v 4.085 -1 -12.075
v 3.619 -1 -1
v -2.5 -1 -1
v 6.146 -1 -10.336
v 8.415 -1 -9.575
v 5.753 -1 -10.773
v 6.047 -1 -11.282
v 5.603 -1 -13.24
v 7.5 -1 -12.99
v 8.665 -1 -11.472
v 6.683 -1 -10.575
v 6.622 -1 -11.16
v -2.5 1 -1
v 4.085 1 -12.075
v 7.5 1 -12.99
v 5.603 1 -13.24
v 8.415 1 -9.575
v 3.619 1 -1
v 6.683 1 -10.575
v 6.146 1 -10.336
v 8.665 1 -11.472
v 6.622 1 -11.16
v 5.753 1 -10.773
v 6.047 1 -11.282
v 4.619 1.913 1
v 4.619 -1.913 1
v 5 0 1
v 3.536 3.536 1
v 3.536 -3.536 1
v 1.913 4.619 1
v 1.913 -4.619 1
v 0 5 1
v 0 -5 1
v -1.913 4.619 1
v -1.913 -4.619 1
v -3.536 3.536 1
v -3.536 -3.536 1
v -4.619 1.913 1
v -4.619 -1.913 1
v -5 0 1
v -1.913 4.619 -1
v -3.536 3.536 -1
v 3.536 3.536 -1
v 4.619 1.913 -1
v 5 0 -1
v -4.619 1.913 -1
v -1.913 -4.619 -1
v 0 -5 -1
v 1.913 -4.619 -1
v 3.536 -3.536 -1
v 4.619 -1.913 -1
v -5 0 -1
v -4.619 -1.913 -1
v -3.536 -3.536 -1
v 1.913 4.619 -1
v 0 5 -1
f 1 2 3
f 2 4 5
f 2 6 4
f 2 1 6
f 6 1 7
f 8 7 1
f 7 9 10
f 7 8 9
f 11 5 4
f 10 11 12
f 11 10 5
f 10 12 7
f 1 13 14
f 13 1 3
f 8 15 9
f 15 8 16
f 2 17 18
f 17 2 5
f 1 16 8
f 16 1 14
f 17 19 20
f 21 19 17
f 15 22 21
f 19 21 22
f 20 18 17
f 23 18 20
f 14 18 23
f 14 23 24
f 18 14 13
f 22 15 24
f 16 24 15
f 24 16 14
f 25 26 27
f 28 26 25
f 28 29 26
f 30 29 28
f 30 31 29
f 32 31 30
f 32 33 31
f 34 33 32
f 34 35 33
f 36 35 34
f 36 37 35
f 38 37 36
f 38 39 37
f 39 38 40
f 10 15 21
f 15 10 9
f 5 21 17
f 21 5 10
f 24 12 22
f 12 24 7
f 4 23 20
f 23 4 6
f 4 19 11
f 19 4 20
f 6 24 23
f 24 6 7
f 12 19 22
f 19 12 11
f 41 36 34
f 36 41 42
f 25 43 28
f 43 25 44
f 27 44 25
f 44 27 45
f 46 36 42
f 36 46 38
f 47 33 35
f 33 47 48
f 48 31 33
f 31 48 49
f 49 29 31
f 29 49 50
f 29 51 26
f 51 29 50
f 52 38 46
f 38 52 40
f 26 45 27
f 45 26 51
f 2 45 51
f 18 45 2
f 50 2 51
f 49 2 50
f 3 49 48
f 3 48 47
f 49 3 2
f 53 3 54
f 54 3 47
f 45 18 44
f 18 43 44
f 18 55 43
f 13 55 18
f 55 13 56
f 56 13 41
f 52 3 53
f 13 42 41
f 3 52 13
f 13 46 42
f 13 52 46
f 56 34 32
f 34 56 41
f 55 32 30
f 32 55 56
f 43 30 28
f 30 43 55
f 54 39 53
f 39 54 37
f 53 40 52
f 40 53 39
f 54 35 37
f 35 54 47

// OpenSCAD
module pushrodmount(baseDiameter,baseHeight,leverLength,leverWidth,leverThickness,leverAngle,holeDiameter){
	// make the base
	cylinder(r=baseDiameter/2,h=baseHeight,center=true);
	rotate([90,0,0]){
		difference(){
			hull(){
				cube([leverWidth,baseHeight,leverThickness],center=true);
				rotate([0,0,leverAngle])translate([0,-leverLength-leverWidth/2,0]) cylinder(r=leverWidth/2,h=leverThickness,center=true);
			}
			// make the hole for the pushrod
			rotate([0,0,leverAngle])translate([0,-leverLength-leverWidth/2,0]) cylinder(r=holeDiameter/2,h=leverThickness*2,center=true);
		}
	}	
}

baseDiameter=10;
baseHeight=2;
leverLength=10;
leverWidth=5;
leverThickness=2;
leverAngle=30;
holeDiameter=1;

pushrodmount(baseDiameter,baseHeight,leverLength,leverWidth,leverThickness,leverAngle,holeDiameter);
